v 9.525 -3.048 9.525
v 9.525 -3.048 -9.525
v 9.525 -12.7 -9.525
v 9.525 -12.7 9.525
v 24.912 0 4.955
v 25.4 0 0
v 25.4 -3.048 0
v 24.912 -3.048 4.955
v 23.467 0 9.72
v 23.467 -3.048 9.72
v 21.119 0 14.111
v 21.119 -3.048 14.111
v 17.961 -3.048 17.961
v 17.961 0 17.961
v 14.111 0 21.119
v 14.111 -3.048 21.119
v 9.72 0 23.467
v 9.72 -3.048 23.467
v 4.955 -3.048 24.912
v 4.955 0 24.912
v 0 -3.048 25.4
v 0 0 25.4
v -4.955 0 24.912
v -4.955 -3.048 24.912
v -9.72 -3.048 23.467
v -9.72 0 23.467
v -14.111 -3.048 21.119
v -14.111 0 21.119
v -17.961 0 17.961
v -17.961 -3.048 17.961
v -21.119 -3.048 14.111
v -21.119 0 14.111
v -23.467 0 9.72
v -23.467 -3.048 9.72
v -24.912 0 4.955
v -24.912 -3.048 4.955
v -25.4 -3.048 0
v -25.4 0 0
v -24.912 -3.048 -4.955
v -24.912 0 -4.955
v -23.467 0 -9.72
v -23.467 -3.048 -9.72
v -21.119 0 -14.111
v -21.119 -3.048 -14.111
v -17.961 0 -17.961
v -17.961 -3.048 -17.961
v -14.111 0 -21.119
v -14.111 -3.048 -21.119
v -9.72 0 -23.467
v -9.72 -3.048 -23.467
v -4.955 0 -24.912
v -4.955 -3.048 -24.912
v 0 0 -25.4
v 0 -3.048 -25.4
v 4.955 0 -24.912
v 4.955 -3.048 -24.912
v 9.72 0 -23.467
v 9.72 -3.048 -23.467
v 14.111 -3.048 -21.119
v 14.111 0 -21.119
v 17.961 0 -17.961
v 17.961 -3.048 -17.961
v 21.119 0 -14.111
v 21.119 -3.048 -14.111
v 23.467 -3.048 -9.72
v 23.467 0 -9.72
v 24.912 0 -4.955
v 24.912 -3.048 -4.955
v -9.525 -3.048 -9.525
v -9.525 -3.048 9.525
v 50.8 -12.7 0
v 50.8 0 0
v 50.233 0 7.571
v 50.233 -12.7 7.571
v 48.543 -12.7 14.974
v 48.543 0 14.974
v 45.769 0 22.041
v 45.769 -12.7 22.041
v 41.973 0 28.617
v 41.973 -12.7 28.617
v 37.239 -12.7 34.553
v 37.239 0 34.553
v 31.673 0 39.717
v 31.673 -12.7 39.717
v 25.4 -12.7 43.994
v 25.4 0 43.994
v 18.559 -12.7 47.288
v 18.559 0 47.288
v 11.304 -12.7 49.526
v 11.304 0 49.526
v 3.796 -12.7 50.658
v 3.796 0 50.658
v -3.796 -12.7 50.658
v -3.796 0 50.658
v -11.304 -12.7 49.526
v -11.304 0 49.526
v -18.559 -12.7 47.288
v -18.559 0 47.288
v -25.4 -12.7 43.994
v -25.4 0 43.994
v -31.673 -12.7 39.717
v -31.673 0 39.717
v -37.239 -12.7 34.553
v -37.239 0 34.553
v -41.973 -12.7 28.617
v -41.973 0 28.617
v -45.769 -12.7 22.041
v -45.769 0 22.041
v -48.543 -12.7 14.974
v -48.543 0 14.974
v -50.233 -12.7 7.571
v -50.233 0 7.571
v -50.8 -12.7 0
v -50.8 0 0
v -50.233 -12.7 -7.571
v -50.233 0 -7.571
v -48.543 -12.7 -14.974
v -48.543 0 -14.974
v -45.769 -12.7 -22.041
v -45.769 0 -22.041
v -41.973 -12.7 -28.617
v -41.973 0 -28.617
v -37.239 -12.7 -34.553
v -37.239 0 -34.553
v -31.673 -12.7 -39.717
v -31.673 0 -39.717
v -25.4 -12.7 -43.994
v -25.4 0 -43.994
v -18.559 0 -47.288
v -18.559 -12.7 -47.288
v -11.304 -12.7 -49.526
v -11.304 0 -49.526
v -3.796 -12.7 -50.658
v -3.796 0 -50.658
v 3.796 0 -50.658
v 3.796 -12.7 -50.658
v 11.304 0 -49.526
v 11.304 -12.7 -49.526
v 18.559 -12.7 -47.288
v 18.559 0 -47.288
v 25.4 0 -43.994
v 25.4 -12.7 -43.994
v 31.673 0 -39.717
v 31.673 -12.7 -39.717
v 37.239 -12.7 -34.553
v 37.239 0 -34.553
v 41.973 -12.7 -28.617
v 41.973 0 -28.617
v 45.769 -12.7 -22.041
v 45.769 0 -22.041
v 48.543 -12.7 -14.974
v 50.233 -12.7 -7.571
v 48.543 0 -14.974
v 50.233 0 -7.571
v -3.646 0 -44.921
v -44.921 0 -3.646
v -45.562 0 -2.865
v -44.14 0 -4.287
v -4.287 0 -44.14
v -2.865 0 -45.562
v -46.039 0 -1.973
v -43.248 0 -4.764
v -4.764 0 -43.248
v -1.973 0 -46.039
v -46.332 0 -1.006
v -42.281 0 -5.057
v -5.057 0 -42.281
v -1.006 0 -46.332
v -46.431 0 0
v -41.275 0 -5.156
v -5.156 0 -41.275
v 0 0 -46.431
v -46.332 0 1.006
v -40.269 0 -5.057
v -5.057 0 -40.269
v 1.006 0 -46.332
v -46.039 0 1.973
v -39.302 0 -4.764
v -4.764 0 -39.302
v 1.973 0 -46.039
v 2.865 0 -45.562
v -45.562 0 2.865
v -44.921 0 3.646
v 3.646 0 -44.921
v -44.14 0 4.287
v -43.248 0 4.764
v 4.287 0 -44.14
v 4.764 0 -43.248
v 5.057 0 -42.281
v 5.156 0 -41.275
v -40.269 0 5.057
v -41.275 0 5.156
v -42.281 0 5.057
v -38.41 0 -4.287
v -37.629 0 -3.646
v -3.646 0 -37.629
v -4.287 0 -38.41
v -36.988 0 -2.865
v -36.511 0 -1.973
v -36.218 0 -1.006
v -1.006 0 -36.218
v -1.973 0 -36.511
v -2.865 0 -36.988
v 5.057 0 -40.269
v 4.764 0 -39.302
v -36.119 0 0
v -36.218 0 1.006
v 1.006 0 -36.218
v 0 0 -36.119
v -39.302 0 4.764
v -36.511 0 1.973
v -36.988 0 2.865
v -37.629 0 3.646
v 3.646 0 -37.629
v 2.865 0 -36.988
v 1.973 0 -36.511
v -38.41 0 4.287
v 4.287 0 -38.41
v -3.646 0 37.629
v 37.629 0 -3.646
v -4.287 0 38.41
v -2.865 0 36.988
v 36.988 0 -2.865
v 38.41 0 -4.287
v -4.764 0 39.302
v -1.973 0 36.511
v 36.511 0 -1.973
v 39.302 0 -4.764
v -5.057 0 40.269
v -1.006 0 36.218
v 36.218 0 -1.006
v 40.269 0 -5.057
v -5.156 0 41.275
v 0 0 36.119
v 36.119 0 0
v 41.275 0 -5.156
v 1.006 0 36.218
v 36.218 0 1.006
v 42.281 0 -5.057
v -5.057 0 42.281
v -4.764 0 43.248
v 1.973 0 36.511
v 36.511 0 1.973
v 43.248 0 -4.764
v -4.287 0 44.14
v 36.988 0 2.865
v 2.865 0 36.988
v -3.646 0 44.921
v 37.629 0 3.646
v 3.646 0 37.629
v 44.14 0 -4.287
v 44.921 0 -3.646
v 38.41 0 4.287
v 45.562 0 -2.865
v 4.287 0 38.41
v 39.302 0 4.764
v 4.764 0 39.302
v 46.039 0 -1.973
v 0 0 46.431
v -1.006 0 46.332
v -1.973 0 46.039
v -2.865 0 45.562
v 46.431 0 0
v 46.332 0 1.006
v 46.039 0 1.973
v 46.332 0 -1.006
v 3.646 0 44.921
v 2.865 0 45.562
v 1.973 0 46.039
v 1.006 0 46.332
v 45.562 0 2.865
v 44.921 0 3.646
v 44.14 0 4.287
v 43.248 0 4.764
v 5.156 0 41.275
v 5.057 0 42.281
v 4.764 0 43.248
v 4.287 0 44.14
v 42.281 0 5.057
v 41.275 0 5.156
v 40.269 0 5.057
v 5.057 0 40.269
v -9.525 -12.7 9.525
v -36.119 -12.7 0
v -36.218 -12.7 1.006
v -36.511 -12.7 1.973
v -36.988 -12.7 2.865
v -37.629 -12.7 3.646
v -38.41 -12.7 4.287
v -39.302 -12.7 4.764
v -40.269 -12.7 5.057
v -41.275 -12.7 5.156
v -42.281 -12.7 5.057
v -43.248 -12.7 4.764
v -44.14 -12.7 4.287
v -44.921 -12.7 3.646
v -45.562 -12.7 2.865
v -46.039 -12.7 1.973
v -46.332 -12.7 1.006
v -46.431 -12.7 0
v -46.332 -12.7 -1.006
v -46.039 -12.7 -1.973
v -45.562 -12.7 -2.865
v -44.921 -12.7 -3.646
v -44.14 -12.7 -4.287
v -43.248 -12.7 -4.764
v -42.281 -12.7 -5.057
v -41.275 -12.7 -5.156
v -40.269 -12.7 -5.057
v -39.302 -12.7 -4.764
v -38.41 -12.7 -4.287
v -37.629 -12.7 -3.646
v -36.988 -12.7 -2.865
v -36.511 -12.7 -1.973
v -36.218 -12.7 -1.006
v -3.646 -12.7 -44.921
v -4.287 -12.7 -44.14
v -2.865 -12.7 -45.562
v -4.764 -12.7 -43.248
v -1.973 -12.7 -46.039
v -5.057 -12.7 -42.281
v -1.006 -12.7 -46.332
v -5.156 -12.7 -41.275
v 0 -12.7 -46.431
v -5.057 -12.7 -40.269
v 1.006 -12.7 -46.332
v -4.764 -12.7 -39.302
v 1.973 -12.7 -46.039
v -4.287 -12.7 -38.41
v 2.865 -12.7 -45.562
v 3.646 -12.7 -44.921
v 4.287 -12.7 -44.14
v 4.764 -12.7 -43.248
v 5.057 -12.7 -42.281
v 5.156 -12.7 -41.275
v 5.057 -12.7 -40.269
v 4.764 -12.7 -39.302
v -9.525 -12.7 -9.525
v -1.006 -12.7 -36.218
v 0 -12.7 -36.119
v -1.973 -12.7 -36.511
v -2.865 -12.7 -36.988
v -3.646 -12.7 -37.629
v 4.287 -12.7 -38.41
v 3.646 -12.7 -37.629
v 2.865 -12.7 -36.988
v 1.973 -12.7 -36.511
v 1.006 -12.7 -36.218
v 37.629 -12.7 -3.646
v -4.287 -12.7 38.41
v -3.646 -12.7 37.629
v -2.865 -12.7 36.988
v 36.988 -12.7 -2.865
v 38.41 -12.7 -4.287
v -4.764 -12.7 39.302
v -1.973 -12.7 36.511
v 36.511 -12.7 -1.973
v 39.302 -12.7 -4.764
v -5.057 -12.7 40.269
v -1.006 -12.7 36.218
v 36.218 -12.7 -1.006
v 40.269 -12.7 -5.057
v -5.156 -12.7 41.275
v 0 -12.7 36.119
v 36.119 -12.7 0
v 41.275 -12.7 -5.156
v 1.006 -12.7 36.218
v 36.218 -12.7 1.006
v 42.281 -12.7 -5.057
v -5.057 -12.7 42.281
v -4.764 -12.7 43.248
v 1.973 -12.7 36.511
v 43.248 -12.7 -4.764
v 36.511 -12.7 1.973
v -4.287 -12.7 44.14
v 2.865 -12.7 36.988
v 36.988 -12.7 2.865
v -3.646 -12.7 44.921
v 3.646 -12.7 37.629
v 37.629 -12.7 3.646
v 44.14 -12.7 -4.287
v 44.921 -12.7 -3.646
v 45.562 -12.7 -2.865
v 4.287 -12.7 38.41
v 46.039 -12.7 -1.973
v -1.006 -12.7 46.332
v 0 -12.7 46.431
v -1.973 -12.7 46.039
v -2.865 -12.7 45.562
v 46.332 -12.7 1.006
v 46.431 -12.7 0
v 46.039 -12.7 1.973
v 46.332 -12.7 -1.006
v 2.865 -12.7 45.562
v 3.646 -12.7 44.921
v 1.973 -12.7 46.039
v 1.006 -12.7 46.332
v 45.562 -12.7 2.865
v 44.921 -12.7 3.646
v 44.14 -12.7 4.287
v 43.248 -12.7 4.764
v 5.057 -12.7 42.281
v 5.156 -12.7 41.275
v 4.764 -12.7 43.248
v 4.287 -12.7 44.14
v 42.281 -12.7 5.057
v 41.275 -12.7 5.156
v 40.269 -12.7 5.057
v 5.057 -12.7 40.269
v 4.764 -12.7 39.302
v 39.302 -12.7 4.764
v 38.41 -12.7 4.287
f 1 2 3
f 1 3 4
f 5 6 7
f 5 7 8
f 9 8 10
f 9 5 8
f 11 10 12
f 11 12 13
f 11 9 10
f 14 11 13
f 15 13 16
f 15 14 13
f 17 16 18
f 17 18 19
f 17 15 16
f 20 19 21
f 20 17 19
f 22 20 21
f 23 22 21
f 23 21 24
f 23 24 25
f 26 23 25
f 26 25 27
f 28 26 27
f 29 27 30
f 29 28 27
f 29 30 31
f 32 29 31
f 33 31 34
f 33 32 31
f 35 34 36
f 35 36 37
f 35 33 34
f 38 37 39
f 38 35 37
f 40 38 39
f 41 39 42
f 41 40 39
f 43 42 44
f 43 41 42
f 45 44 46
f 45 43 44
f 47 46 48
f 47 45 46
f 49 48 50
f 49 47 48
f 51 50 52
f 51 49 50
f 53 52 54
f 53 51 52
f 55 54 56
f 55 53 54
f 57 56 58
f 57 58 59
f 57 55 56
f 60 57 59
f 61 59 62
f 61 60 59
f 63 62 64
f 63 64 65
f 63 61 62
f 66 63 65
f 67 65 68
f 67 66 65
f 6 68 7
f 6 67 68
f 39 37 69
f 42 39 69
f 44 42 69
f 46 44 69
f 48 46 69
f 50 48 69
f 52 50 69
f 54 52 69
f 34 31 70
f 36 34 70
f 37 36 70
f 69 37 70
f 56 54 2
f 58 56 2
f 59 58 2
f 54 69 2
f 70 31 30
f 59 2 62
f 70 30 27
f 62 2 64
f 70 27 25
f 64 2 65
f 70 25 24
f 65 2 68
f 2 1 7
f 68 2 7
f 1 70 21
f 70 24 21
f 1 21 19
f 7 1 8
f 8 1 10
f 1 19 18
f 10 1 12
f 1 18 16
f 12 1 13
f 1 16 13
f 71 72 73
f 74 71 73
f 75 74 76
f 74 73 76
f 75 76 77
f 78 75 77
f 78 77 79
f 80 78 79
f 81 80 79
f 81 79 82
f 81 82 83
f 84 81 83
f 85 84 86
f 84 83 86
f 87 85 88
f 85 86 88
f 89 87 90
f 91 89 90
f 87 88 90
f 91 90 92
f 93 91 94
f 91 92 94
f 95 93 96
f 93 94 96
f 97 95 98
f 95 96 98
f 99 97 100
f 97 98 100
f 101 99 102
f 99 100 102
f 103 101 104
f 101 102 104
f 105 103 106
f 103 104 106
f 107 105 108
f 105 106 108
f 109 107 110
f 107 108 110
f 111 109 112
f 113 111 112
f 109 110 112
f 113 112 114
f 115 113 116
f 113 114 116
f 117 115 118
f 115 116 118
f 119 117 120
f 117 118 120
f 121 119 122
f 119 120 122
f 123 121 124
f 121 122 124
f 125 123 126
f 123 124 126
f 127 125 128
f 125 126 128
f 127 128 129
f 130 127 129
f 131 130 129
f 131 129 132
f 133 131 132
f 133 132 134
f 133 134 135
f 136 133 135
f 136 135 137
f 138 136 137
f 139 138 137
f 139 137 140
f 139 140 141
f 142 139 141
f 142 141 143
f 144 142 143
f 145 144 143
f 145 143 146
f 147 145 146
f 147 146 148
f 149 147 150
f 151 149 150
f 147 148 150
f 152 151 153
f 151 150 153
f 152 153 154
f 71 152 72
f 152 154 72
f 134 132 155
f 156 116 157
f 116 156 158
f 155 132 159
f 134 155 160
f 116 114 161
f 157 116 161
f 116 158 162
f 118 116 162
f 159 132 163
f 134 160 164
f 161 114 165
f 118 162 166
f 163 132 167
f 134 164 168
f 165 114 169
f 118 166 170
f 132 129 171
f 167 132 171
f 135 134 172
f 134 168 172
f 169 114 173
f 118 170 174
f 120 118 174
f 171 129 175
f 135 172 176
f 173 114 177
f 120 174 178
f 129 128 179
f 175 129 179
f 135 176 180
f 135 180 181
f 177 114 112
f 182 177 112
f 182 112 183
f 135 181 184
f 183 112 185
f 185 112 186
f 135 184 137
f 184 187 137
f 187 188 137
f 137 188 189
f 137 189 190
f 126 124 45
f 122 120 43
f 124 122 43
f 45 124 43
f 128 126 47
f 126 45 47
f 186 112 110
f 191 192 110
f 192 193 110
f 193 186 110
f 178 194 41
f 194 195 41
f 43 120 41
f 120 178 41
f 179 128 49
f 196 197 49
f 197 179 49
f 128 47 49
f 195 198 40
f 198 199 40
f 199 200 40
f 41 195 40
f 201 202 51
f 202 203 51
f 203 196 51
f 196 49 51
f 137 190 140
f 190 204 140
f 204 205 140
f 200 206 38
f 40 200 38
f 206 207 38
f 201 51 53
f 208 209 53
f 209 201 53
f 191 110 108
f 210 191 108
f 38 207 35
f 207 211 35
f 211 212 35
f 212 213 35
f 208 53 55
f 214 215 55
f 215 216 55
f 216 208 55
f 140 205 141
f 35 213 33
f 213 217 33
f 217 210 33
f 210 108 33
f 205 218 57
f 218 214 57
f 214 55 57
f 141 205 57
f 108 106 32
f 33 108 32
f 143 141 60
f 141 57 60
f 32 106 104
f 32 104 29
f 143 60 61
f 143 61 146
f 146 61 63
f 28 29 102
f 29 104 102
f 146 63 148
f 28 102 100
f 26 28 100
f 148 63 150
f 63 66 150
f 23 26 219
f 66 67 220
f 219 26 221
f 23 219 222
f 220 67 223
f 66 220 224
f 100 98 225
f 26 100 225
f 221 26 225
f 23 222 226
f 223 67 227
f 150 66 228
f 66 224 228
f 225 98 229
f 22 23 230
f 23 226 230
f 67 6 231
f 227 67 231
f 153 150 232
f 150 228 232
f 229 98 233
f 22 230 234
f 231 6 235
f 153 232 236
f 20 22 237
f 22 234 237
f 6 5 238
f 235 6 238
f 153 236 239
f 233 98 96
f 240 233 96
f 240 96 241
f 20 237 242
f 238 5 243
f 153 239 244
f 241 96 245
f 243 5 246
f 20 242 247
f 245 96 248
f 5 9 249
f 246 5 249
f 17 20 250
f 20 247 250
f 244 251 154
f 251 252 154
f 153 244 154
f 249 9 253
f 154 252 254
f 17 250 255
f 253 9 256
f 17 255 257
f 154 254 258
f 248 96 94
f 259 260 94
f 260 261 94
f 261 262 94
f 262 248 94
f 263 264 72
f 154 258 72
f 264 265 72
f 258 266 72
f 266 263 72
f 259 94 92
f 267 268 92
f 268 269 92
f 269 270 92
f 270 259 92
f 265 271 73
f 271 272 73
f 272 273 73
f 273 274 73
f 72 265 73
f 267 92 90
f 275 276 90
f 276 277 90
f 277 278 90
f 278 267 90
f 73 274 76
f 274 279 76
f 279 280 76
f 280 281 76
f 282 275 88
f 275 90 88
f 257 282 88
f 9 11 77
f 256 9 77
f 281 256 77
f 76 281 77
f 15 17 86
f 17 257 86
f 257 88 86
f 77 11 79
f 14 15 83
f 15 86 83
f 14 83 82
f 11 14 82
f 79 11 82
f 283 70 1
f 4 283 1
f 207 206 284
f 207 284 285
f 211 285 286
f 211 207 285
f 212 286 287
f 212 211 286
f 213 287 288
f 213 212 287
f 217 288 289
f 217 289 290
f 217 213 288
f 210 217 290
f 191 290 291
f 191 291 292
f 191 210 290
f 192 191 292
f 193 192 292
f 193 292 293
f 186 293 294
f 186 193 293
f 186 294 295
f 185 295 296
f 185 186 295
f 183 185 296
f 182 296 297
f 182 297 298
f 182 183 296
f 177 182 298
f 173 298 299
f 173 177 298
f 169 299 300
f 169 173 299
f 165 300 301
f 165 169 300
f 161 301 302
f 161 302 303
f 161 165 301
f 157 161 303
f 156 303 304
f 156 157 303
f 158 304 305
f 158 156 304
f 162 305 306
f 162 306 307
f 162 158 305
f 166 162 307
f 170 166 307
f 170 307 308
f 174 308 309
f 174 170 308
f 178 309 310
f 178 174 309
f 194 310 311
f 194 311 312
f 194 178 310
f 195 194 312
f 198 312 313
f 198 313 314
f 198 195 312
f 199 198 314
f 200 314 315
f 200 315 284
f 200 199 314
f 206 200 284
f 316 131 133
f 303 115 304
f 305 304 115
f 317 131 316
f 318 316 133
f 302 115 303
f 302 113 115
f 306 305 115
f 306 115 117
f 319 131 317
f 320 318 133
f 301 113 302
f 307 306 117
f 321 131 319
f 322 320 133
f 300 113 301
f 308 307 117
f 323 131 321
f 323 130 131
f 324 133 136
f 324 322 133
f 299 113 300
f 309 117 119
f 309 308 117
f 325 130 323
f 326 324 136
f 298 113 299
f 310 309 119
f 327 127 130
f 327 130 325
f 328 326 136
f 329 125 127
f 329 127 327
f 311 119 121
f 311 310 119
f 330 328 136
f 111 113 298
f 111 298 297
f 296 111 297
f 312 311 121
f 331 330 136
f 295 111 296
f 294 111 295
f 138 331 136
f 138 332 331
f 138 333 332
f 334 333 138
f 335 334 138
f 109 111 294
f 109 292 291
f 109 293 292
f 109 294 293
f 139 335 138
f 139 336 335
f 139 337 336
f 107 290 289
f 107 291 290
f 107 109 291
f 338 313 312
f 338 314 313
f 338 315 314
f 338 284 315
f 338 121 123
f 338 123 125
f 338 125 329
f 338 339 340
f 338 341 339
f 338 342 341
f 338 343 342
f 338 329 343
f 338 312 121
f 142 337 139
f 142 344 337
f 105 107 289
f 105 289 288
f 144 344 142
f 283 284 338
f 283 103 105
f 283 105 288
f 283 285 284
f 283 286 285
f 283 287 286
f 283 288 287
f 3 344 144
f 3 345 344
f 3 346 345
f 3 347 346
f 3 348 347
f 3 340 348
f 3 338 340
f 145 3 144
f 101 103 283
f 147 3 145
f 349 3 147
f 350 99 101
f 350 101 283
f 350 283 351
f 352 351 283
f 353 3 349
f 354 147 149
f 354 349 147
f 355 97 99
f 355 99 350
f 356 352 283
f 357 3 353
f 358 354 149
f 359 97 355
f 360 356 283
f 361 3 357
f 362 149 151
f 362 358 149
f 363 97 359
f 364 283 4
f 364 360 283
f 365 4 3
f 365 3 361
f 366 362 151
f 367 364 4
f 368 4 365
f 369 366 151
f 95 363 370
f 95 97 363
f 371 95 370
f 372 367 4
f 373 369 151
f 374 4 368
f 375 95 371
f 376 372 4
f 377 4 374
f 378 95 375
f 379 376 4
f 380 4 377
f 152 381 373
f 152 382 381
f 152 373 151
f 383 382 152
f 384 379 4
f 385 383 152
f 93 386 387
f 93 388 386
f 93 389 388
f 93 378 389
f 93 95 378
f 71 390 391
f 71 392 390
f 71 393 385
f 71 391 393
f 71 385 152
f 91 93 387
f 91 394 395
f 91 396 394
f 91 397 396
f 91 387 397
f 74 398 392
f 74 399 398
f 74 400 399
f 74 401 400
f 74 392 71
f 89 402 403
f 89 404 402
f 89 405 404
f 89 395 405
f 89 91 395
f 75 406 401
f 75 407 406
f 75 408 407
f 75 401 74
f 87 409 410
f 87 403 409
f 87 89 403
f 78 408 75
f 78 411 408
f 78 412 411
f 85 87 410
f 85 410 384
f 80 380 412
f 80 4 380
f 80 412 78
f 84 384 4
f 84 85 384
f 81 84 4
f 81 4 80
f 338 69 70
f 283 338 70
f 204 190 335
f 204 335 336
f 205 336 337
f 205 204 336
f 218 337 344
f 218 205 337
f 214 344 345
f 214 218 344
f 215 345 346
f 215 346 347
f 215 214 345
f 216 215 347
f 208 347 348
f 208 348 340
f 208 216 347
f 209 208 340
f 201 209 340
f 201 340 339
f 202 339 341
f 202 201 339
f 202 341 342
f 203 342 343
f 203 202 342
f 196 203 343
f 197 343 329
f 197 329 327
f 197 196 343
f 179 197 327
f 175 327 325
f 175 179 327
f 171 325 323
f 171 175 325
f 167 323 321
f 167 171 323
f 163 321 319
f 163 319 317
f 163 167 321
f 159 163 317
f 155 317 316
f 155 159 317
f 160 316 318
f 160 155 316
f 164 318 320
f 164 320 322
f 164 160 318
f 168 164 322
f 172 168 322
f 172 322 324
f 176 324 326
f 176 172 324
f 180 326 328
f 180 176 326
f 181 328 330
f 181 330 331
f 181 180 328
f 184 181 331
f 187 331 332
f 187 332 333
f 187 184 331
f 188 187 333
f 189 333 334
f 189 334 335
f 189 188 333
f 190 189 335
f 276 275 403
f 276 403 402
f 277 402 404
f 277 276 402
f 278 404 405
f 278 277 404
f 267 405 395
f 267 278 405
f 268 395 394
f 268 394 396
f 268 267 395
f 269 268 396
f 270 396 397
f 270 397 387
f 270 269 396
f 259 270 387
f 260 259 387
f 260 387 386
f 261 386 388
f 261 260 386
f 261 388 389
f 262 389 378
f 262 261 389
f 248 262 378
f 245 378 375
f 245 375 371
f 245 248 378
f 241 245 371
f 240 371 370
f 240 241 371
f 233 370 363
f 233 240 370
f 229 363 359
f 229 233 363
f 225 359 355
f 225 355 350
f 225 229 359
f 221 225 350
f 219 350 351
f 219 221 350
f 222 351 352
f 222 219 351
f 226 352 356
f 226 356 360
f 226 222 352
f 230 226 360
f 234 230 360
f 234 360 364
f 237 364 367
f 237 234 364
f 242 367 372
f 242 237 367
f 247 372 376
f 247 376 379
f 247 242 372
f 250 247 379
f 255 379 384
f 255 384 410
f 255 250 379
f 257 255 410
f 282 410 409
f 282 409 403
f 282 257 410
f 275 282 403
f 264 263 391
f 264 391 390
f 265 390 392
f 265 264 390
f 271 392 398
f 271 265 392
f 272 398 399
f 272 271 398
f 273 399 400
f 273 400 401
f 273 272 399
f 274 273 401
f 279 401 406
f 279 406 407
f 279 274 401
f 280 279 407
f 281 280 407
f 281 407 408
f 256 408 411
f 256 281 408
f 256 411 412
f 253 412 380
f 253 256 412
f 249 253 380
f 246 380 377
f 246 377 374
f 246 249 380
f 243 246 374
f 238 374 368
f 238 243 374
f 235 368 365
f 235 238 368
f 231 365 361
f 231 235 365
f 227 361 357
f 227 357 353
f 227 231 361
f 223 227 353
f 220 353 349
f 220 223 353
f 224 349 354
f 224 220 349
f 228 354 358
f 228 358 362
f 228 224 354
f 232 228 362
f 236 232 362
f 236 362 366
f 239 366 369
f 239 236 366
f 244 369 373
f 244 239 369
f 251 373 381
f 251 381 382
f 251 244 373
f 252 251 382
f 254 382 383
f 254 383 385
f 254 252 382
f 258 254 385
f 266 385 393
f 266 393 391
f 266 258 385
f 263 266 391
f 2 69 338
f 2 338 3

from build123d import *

# Parameters (mm, degrees)
F0_R     = 50.8
F0_R_2   = 5.1562
F0_W     = 19.05
F0_H     = 19.05
F1_DEPTH = 12.7
F2_R     = 25.4
F3_DEPTH = 3.048


with BuildPart() as f1:
    # F0 (on Front) → F1 (new body)
    with BuildSketch(Plane.XZ):
        Circle(F0_R)
        with Locations((0, -41.275)):
            Circle(F0_R_2, mode=Mode.SUBTRACT)
        with Locations((-41.275, 0)):
            Circle(F0_R_2, mode=Mode.SUBTRACT)
        Rectangle(F0_W, F0_H, mode=Mode.SUBTRACT)
        with Locations((41.275, 0)):
            Circle(F0_R_2, mode=Mode.SUBTRACT)
        with Locations((0, 41.275)):
            Circle(F0_R_2, mode=Mode.SUBTRACT)
    extrude(amount=F1_DEPTH)

    # F2 (on Front) → F3 (cut)
    with BuildSketch(Plane.XZ):
        Circle(F2_R)
    extrude(amount=F3_DEPTH, mode=Mode.SUBTRACT)


solid = f1.part
